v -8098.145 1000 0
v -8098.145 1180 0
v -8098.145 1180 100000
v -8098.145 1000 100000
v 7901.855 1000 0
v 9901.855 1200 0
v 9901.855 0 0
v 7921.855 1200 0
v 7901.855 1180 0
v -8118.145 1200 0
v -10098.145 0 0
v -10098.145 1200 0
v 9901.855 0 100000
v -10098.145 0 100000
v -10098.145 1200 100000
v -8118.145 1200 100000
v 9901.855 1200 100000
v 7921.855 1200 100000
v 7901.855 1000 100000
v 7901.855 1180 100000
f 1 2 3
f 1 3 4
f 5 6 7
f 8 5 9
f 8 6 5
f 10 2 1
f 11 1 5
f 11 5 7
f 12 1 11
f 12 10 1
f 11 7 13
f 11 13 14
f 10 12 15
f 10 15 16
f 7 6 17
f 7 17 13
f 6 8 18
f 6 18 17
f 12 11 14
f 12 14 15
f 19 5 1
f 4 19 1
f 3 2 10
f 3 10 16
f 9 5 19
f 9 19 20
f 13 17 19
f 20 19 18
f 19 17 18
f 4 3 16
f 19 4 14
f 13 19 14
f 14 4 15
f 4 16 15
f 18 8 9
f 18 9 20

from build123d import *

# Parameters (mm, degrees)
BOSS_EXTRU_1_DEPTH = 100000
CHANFREIN1_SIZE    = 20
CHANFREIN2_SIZE    = 20


with BuildPart() as part:
    # Esquisse1 → Boss.-Extru.1 (new body)
    with BuildSketch(Plane.XY):
        Polygon((-10098.145385544, 0), (-10098.145385544, 1200), (-8098.145385544, 1200), (-8098.145385544, 1000), (0, 1000), (7901.854614456, 1000), (7901.854614456, 1200), (9901.854614456, 1200), (9901.854614456, 0), align=None)
    extrude(amount=BOSS_EXTRU_1_DEPTH)

    # Chanfrein1
    chanfrein1_edges = [part.edges().sort_by_distance(p)[0] for p in [
        (-8098.145385544, 1200, 50000),
    ]]
    chamfer(chanfrein1_edges, length=CHANFREIN1_SIZE)

    # Chanfrein2
    chanfrein2_edges = [part.edges().sort_by_distance(p)[0] for p in [
        (7901.854614456, 1200, 50000),
    ]]
    chamfer(chanfrein2_edges, length=CHANFREIN2_SIZE)


solid = part.part
